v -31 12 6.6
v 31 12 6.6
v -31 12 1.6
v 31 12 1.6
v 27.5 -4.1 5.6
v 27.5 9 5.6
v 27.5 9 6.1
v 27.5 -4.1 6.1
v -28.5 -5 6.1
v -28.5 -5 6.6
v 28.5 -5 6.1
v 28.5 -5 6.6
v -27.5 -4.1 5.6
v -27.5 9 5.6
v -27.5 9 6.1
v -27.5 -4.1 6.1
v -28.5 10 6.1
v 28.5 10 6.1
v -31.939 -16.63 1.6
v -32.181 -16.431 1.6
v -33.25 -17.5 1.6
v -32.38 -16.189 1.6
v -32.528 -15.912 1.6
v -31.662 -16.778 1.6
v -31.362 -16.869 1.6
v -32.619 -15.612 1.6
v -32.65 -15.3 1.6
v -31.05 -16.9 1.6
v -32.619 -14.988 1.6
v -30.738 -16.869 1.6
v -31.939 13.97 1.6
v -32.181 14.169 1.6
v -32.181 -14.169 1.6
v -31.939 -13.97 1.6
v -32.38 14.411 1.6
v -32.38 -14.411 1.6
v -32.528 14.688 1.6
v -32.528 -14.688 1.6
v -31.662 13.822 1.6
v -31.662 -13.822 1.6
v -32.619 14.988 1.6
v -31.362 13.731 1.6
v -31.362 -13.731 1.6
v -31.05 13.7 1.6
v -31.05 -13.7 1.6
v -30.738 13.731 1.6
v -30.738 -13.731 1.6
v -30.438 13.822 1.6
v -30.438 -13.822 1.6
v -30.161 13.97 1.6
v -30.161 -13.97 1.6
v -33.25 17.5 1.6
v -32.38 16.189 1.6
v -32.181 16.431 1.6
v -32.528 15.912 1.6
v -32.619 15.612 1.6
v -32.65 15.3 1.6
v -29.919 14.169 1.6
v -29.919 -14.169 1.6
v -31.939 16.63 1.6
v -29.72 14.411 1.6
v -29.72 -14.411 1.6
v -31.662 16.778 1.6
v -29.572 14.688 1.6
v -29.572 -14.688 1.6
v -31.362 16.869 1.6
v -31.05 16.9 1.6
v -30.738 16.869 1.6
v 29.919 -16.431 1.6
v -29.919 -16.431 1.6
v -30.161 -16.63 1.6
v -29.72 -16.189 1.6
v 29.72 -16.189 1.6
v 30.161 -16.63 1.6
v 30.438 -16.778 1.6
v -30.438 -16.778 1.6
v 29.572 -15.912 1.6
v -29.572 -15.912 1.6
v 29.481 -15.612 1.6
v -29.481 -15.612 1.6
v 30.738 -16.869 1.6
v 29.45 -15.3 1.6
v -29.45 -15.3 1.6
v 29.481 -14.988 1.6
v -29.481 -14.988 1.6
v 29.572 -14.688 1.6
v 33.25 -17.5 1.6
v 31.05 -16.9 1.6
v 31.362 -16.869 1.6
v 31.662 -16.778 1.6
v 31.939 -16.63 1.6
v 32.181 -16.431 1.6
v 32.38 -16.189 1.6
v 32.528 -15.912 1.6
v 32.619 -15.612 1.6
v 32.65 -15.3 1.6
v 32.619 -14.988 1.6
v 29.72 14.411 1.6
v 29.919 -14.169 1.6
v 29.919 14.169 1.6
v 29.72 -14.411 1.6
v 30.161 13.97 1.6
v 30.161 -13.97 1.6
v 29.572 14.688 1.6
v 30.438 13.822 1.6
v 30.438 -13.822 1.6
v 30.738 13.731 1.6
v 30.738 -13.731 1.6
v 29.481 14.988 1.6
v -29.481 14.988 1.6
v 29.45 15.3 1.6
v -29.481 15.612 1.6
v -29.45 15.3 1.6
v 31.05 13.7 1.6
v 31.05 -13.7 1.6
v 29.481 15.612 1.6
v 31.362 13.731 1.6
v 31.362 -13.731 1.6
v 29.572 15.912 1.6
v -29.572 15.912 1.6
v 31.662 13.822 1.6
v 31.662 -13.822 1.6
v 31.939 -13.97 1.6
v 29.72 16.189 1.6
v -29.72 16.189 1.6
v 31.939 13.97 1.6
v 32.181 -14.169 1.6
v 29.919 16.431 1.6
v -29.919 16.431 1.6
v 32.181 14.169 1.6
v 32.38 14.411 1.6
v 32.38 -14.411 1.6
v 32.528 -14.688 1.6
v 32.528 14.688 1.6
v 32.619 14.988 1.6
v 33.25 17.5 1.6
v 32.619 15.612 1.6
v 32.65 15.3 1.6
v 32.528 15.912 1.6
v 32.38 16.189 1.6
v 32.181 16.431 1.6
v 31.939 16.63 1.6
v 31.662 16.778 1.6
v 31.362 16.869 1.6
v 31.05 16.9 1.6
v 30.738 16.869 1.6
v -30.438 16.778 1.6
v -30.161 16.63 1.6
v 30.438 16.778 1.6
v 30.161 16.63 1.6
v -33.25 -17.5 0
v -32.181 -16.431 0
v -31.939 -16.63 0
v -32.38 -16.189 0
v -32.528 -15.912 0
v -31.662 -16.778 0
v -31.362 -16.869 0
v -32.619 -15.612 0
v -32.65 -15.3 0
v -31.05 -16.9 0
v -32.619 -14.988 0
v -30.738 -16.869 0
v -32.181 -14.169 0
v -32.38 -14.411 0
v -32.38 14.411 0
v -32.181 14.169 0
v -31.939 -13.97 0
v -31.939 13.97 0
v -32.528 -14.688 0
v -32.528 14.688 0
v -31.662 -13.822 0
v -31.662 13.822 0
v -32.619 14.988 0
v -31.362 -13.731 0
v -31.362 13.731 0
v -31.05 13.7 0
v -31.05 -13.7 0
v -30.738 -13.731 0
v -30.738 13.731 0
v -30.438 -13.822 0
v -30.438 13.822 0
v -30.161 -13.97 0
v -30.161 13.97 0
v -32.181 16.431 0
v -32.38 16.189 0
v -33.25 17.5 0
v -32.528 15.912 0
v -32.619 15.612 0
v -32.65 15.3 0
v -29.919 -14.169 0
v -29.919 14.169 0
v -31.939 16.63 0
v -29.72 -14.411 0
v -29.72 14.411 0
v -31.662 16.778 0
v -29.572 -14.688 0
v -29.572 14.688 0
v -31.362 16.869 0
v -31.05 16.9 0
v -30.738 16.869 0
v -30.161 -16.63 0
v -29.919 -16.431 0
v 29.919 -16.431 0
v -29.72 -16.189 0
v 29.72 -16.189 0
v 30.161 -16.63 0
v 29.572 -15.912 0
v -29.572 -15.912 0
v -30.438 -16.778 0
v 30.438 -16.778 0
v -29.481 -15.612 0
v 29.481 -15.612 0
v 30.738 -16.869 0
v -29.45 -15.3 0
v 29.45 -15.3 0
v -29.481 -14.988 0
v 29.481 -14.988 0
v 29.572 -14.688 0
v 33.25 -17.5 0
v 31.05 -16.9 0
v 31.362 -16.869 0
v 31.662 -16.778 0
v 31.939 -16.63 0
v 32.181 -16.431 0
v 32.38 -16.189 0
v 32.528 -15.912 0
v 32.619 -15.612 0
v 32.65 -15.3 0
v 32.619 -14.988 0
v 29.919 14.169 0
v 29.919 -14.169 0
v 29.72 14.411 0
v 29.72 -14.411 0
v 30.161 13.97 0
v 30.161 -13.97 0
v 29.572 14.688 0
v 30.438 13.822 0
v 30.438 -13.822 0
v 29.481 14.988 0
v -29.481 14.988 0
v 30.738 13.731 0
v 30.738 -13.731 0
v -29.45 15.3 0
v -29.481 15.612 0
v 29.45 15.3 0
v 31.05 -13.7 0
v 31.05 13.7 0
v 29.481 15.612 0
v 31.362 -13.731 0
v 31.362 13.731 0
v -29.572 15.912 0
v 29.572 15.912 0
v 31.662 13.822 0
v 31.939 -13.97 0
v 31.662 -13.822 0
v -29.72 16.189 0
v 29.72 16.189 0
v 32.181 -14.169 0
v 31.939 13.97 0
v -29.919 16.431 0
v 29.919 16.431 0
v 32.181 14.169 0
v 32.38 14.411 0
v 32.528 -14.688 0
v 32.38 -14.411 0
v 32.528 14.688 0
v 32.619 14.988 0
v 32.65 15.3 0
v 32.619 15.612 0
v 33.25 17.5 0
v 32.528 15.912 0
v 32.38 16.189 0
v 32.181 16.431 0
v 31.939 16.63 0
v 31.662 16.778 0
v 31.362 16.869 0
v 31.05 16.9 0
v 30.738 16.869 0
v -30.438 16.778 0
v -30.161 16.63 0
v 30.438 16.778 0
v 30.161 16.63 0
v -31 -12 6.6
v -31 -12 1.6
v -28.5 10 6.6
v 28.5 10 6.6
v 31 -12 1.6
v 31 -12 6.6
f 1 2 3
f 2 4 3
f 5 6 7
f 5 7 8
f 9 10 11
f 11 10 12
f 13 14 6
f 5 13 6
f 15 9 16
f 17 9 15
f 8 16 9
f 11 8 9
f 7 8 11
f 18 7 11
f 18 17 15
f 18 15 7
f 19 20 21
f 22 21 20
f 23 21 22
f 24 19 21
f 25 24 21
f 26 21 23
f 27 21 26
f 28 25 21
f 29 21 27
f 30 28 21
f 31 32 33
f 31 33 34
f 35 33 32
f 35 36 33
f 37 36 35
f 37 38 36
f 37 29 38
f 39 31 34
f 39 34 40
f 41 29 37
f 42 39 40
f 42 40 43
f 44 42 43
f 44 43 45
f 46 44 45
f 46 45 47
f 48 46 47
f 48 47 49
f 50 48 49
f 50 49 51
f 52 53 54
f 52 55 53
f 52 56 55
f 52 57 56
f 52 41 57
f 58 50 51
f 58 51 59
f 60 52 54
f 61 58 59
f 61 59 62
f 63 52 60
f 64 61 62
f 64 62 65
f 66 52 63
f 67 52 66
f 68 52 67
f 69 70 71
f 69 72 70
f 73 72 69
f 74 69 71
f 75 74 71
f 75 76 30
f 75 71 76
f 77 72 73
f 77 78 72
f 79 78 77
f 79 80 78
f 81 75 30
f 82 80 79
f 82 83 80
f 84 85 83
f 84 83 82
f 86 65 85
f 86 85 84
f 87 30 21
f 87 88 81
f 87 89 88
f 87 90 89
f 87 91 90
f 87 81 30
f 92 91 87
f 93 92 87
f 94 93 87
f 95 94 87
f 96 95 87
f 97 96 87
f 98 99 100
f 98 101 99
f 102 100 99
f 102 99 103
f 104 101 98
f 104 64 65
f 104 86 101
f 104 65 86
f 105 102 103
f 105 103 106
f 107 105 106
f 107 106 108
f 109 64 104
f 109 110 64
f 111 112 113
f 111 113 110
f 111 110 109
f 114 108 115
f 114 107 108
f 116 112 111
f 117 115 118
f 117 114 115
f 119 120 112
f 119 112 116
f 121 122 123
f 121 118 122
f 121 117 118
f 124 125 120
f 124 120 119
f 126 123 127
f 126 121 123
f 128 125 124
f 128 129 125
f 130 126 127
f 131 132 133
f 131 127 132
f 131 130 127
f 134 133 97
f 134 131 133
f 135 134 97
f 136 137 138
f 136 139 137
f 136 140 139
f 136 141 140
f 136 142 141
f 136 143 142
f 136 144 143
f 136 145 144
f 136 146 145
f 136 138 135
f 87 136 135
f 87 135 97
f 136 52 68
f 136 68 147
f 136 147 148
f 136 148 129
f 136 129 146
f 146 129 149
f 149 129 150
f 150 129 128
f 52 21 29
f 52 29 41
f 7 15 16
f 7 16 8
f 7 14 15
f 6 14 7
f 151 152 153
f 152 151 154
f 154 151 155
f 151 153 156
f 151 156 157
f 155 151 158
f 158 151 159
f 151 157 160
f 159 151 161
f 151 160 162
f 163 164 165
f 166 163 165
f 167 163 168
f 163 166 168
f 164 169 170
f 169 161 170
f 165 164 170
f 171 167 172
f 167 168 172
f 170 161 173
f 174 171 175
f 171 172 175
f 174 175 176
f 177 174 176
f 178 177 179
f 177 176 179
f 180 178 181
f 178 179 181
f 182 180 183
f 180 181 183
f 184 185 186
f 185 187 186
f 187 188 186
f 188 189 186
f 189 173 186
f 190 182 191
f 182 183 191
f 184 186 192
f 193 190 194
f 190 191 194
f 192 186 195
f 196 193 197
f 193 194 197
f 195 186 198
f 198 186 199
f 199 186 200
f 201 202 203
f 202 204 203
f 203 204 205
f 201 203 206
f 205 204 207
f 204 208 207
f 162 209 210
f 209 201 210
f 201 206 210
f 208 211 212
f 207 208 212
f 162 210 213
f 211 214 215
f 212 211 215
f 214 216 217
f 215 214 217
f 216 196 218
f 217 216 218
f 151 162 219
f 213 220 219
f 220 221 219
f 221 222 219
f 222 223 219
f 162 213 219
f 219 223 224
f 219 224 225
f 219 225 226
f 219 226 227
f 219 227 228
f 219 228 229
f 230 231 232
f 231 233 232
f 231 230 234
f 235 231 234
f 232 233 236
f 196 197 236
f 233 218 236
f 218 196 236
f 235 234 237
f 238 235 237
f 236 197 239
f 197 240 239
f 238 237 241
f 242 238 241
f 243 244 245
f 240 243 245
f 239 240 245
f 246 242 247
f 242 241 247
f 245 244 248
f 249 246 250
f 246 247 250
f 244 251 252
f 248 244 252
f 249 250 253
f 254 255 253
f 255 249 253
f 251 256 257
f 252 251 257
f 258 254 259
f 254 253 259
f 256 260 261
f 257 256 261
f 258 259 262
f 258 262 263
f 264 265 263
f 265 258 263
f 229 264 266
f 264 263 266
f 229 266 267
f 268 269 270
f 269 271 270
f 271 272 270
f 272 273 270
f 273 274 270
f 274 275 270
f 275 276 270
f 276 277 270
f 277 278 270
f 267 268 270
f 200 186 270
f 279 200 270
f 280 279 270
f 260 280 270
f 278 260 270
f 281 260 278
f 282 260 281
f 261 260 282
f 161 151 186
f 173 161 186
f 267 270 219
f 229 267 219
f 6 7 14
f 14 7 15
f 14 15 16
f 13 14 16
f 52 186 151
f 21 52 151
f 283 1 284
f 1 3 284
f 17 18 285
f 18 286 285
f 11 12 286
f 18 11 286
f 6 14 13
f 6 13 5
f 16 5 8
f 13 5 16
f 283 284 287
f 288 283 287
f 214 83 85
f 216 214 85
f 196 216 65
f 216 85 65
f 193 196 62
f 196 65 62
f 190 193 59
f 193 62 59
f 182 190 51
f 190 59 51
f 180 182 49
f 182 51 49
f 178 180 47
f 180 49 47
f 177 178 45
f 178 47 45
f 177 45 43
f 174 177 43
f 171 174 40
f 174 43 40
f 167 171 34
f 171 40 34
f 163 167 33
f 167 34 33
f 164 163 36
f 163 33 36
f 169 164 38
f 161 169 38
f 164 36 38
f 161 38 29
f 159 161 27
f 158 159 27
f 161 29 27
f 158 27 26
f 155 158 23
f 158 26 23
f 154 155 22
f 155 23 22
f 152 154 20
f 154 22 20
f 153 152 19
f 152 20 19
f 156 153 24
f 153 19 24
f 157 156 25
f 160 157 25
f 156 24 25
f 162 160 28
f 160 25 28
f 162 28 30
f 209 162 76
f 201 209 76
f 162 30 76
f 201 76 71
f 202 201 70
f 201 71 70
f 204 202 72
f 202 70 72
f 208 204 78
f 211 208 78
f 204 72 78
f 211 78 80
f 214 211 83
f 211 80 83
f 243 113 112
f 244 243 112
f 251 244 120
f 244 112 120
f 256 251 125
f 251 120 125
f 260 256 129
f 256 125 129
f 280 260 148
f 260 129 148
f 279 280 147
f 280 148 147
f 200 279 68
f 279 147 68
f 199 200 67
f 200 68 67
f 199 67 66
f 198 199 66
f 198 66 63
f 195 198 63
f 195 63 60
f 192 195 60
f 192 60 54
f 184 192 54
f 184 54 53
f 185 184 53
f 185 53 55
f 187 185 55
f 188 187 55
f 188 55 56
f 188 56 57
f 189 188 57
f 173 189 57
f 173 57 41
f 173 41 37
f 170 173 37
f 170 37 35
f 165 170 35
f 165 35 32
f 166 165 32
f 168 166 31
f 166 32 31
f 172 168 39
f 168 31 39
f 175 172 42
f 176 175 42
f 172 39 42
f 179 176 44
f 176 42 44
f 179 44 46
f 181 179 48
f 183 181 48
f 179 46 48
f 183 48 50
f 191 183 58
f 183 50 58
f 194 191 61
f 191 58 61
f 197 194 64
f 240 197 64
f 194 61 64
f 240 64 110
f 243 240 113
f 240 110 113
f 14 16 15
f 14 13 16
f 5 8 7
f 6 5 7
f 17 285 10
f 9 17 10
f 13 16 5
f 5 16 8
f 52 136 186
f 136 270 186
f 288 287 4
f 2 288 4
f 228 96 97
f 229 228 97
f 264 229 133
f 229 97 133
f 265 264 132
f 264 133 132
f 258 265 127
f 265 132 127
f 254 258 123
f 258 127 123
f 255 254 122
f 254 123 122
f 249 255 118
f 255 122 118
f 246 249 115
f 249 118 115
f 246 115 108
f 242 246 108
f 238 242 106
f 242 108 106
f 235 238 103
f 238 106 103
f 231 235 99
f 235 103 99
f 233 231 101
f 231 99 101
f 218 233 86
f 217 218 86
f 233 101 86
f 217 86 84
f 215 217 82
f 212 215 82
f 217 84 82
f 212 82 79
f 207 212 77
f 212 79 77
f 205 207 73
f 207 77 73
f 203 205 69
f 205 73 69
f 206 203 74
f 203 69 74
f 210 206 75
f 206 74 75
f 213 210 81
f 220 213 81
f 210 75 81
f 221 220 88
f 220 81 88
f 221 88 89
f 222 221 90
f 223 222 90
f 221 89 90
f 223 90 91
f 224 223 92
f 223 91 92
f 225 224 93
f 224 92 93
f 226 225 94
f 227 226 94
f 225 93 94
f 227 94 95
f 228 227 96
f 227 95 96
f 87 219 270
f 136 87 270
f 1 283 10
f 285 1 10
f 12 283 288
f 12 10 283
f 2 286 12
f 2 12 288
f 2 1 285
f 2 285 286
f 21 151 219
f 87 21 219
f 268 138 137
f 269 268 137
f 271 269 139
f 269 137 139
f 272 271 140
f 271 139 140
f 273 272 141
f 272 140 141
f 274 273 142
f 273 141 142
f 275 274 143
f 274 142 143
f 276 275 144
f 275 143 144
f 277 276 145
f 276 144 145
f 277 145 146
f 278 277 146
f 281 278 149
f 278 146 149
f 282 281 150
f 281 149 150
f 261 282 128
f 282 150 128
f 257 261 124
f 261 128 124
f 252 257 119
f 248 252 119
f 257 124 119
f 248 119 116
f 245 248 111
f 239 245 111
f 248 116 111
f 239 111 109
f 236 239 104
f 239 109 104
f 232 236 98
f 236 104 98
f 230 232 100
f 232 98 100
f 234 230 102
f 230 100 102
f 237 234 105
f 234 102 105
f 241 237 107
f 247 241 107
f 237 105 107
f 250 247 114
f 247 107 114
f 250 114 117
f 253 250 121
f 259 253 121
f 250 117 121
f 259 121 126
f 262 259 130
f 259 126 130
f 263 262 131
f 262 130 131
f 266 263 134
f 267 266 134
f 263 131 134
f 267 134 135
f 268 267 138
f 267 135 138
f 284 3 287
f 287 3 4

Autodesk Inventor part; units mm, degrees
ref_plane "YZ Plane" through (0, 0, 0) normal (1, 0, 0) x (0, 1, 0)
ref_plane "XZ Plane" through (0, 0, 0) normal (0, 1, 0) x (-1, 0, 0)
ref_plane "XY Plane" through (0, 0, 0) normal (0, 0, 1) x (1, 0, 0)
sketch "Sketch1" plane through (0, 0, 0) normal (0, 0, 1) x (1, 0, 0)
  line L0 (-33.25, -17.5) -> (33.25, -17.5)
  line L1 (33.25, -17.5) -> (33.25, 17.5)
  line L2 (33.25, 17.5) -> (-33.25, 17.5)
  line L3 (-33.25, 17.5) -> (-33.25, -17.5)
  line L4 (-33.25, -17.5) -> (33.25, 17.5) construction
  line L5 (33.25, -17.5) -> (-33.25, 17.5) construction
  point P0 (0, 0)
  dimension "d0" = 66.5
  dimension "d1" = 35
extrude "Extrusion1" add sketch "Sketch1" along normal blind 1.6
sketch "Sketch2" plane through (0, 0, 1.6) normal (0, 0, 1) x (1, 0, 0)
  line L0 (-46.55, 0) -> (46.55, 0) construction
  line L1 (0, -24.5) -> (0, 24.5) construction
  circle A0 centre (-31.05, 15.3) radius 1.6
  line L2 (33.25, 17.5) -> (-33.25, 17.5) construction
  line L3 (-33.25, 17.5) -> (-33.25, -17.5) construction
  circle A1 centre (31.05, 15.3) radius 1.6
  circle A2 centre (-31.05, -15.3) radius 1.6
  line L4 (33.25, -17.5) -> (-33.25, -17.5) construction
  circle A3 centre (31.05, -15.3) radius 1.6
  point P0 (0, 0)
  dimension "d4" = 3.2
  dimension "d5" = 0.6
  dimension "d6" = 0.6
extrude "Extrusion2" cut sketch "Sketch2" against normal through all
sketch "Sketch3" plane through (0, 0, 1.6) normal (0, 0, 1) x (1, 0, 0)
  line L0 (0, 24.5) -> (0, -24.5) projected
  line L1 (-31, -12) -> (31, -12)
  line L2 (31, -12) -> (31, 12)
  line L3 (31, 12) -> (-31, 12)
  line L4 (-31, 12) -> (-31, -12)
  line L5 (-31, -12) -> (31, 12) construction
  line L6 (31, -12) -> (-31, 12) construction
  point P0 (0, 0)
  dimension "d9" = 24
  dimension "d10" = 62
extrude "Extrusion3" add sketch "Sketch3" along normal blind 5 separate body
sketch "Sketch4" plane through (0, 0, 6.6) normal (0, 0, 1) x (1, 0, 0)
  line L0 (0, -24.5) -> (0, 24.5) projected
  line L1 (-28.5, -5) -> (28.5, -5)
  line L2 (28.5, -5) -> (28.5, 10)
  line L3 (28.5, 10) -> (-28.5, 10)
  line L4 (-28.5, 10) -> (-28.5, -5)
  line L5 (-28.5, -5) -> (28.5, 10) construction
  line L6 (28.5, -5) -> (-28.5, 10) construction
  line L7 (31, 12) -> (-31, 12) projected
  point P0 (0, 0)
  point P1 (0, 2.5)
  dimension "d13" = 15
  dimension "d14" = 57
  dimension "d15" = 2
extrude "Extrusion4" cut sketch "Sketch4" against normal blind 0.5 bodies 2
sketch "Sketch5" plane through (0, 0, 6.1) normal (0, 0, 1) x (1, 0, 0)
  line L0 (0, 24.5) -> (0, -24.5) projected
  line L1 (-27.5, -4.1) -> (27.5, -4.1)
  line L2 (27.5, -4.1) -> (27.5, 9)
  line L3 (27.5, 9) -> (-27.5, 9)
  line L4 (-27.5, 9) -> (-27.5, -4.1)
  line L5 (-27.5, -4.1) -> (27.5, 9) construction
  line L6 (27.5, -4.1) -> (-27.5, 9) construction
  line L7 (31, 12) -> (-31, 12) projected
  point P0 (0, 0)
  point P1 (0, 2.45)
  dimension "d18" = 13.1
  dimension "d19" = 55
  dimension "d20" = 3
extrude "Extrusion5" cut sketch "Sketch5" against normal blind 0.5 bodies 2
sketch "Sketch6" plane through (0, 0, 5.6) normal (0, 0, 1) x (1, 0, 0)
  line L0 (27.5, -4.1) -> (-27.5, -4.1) projected
  line L1 (27.5, 9) -> (27.5, -4.1) projected
  line L2 (-27.5, 9) -> (27.5, 9) projected
  line L3 (-27.5, -4.1) -> (-27.5, 9) projected
  point P0 (0, 0)
extrude "Extrusion6" add sketch "Sketch6" along normal blind 0.5 separate body
sketch "Sketch7" plane through (0, 0, 6.6) normal (0, 0, 1) x (1, 0, 0)
  circle A0 centre (0, 0) radius 6.7082
equation "\"d6\" = d5"
properties part number "Adafruit_2675"
